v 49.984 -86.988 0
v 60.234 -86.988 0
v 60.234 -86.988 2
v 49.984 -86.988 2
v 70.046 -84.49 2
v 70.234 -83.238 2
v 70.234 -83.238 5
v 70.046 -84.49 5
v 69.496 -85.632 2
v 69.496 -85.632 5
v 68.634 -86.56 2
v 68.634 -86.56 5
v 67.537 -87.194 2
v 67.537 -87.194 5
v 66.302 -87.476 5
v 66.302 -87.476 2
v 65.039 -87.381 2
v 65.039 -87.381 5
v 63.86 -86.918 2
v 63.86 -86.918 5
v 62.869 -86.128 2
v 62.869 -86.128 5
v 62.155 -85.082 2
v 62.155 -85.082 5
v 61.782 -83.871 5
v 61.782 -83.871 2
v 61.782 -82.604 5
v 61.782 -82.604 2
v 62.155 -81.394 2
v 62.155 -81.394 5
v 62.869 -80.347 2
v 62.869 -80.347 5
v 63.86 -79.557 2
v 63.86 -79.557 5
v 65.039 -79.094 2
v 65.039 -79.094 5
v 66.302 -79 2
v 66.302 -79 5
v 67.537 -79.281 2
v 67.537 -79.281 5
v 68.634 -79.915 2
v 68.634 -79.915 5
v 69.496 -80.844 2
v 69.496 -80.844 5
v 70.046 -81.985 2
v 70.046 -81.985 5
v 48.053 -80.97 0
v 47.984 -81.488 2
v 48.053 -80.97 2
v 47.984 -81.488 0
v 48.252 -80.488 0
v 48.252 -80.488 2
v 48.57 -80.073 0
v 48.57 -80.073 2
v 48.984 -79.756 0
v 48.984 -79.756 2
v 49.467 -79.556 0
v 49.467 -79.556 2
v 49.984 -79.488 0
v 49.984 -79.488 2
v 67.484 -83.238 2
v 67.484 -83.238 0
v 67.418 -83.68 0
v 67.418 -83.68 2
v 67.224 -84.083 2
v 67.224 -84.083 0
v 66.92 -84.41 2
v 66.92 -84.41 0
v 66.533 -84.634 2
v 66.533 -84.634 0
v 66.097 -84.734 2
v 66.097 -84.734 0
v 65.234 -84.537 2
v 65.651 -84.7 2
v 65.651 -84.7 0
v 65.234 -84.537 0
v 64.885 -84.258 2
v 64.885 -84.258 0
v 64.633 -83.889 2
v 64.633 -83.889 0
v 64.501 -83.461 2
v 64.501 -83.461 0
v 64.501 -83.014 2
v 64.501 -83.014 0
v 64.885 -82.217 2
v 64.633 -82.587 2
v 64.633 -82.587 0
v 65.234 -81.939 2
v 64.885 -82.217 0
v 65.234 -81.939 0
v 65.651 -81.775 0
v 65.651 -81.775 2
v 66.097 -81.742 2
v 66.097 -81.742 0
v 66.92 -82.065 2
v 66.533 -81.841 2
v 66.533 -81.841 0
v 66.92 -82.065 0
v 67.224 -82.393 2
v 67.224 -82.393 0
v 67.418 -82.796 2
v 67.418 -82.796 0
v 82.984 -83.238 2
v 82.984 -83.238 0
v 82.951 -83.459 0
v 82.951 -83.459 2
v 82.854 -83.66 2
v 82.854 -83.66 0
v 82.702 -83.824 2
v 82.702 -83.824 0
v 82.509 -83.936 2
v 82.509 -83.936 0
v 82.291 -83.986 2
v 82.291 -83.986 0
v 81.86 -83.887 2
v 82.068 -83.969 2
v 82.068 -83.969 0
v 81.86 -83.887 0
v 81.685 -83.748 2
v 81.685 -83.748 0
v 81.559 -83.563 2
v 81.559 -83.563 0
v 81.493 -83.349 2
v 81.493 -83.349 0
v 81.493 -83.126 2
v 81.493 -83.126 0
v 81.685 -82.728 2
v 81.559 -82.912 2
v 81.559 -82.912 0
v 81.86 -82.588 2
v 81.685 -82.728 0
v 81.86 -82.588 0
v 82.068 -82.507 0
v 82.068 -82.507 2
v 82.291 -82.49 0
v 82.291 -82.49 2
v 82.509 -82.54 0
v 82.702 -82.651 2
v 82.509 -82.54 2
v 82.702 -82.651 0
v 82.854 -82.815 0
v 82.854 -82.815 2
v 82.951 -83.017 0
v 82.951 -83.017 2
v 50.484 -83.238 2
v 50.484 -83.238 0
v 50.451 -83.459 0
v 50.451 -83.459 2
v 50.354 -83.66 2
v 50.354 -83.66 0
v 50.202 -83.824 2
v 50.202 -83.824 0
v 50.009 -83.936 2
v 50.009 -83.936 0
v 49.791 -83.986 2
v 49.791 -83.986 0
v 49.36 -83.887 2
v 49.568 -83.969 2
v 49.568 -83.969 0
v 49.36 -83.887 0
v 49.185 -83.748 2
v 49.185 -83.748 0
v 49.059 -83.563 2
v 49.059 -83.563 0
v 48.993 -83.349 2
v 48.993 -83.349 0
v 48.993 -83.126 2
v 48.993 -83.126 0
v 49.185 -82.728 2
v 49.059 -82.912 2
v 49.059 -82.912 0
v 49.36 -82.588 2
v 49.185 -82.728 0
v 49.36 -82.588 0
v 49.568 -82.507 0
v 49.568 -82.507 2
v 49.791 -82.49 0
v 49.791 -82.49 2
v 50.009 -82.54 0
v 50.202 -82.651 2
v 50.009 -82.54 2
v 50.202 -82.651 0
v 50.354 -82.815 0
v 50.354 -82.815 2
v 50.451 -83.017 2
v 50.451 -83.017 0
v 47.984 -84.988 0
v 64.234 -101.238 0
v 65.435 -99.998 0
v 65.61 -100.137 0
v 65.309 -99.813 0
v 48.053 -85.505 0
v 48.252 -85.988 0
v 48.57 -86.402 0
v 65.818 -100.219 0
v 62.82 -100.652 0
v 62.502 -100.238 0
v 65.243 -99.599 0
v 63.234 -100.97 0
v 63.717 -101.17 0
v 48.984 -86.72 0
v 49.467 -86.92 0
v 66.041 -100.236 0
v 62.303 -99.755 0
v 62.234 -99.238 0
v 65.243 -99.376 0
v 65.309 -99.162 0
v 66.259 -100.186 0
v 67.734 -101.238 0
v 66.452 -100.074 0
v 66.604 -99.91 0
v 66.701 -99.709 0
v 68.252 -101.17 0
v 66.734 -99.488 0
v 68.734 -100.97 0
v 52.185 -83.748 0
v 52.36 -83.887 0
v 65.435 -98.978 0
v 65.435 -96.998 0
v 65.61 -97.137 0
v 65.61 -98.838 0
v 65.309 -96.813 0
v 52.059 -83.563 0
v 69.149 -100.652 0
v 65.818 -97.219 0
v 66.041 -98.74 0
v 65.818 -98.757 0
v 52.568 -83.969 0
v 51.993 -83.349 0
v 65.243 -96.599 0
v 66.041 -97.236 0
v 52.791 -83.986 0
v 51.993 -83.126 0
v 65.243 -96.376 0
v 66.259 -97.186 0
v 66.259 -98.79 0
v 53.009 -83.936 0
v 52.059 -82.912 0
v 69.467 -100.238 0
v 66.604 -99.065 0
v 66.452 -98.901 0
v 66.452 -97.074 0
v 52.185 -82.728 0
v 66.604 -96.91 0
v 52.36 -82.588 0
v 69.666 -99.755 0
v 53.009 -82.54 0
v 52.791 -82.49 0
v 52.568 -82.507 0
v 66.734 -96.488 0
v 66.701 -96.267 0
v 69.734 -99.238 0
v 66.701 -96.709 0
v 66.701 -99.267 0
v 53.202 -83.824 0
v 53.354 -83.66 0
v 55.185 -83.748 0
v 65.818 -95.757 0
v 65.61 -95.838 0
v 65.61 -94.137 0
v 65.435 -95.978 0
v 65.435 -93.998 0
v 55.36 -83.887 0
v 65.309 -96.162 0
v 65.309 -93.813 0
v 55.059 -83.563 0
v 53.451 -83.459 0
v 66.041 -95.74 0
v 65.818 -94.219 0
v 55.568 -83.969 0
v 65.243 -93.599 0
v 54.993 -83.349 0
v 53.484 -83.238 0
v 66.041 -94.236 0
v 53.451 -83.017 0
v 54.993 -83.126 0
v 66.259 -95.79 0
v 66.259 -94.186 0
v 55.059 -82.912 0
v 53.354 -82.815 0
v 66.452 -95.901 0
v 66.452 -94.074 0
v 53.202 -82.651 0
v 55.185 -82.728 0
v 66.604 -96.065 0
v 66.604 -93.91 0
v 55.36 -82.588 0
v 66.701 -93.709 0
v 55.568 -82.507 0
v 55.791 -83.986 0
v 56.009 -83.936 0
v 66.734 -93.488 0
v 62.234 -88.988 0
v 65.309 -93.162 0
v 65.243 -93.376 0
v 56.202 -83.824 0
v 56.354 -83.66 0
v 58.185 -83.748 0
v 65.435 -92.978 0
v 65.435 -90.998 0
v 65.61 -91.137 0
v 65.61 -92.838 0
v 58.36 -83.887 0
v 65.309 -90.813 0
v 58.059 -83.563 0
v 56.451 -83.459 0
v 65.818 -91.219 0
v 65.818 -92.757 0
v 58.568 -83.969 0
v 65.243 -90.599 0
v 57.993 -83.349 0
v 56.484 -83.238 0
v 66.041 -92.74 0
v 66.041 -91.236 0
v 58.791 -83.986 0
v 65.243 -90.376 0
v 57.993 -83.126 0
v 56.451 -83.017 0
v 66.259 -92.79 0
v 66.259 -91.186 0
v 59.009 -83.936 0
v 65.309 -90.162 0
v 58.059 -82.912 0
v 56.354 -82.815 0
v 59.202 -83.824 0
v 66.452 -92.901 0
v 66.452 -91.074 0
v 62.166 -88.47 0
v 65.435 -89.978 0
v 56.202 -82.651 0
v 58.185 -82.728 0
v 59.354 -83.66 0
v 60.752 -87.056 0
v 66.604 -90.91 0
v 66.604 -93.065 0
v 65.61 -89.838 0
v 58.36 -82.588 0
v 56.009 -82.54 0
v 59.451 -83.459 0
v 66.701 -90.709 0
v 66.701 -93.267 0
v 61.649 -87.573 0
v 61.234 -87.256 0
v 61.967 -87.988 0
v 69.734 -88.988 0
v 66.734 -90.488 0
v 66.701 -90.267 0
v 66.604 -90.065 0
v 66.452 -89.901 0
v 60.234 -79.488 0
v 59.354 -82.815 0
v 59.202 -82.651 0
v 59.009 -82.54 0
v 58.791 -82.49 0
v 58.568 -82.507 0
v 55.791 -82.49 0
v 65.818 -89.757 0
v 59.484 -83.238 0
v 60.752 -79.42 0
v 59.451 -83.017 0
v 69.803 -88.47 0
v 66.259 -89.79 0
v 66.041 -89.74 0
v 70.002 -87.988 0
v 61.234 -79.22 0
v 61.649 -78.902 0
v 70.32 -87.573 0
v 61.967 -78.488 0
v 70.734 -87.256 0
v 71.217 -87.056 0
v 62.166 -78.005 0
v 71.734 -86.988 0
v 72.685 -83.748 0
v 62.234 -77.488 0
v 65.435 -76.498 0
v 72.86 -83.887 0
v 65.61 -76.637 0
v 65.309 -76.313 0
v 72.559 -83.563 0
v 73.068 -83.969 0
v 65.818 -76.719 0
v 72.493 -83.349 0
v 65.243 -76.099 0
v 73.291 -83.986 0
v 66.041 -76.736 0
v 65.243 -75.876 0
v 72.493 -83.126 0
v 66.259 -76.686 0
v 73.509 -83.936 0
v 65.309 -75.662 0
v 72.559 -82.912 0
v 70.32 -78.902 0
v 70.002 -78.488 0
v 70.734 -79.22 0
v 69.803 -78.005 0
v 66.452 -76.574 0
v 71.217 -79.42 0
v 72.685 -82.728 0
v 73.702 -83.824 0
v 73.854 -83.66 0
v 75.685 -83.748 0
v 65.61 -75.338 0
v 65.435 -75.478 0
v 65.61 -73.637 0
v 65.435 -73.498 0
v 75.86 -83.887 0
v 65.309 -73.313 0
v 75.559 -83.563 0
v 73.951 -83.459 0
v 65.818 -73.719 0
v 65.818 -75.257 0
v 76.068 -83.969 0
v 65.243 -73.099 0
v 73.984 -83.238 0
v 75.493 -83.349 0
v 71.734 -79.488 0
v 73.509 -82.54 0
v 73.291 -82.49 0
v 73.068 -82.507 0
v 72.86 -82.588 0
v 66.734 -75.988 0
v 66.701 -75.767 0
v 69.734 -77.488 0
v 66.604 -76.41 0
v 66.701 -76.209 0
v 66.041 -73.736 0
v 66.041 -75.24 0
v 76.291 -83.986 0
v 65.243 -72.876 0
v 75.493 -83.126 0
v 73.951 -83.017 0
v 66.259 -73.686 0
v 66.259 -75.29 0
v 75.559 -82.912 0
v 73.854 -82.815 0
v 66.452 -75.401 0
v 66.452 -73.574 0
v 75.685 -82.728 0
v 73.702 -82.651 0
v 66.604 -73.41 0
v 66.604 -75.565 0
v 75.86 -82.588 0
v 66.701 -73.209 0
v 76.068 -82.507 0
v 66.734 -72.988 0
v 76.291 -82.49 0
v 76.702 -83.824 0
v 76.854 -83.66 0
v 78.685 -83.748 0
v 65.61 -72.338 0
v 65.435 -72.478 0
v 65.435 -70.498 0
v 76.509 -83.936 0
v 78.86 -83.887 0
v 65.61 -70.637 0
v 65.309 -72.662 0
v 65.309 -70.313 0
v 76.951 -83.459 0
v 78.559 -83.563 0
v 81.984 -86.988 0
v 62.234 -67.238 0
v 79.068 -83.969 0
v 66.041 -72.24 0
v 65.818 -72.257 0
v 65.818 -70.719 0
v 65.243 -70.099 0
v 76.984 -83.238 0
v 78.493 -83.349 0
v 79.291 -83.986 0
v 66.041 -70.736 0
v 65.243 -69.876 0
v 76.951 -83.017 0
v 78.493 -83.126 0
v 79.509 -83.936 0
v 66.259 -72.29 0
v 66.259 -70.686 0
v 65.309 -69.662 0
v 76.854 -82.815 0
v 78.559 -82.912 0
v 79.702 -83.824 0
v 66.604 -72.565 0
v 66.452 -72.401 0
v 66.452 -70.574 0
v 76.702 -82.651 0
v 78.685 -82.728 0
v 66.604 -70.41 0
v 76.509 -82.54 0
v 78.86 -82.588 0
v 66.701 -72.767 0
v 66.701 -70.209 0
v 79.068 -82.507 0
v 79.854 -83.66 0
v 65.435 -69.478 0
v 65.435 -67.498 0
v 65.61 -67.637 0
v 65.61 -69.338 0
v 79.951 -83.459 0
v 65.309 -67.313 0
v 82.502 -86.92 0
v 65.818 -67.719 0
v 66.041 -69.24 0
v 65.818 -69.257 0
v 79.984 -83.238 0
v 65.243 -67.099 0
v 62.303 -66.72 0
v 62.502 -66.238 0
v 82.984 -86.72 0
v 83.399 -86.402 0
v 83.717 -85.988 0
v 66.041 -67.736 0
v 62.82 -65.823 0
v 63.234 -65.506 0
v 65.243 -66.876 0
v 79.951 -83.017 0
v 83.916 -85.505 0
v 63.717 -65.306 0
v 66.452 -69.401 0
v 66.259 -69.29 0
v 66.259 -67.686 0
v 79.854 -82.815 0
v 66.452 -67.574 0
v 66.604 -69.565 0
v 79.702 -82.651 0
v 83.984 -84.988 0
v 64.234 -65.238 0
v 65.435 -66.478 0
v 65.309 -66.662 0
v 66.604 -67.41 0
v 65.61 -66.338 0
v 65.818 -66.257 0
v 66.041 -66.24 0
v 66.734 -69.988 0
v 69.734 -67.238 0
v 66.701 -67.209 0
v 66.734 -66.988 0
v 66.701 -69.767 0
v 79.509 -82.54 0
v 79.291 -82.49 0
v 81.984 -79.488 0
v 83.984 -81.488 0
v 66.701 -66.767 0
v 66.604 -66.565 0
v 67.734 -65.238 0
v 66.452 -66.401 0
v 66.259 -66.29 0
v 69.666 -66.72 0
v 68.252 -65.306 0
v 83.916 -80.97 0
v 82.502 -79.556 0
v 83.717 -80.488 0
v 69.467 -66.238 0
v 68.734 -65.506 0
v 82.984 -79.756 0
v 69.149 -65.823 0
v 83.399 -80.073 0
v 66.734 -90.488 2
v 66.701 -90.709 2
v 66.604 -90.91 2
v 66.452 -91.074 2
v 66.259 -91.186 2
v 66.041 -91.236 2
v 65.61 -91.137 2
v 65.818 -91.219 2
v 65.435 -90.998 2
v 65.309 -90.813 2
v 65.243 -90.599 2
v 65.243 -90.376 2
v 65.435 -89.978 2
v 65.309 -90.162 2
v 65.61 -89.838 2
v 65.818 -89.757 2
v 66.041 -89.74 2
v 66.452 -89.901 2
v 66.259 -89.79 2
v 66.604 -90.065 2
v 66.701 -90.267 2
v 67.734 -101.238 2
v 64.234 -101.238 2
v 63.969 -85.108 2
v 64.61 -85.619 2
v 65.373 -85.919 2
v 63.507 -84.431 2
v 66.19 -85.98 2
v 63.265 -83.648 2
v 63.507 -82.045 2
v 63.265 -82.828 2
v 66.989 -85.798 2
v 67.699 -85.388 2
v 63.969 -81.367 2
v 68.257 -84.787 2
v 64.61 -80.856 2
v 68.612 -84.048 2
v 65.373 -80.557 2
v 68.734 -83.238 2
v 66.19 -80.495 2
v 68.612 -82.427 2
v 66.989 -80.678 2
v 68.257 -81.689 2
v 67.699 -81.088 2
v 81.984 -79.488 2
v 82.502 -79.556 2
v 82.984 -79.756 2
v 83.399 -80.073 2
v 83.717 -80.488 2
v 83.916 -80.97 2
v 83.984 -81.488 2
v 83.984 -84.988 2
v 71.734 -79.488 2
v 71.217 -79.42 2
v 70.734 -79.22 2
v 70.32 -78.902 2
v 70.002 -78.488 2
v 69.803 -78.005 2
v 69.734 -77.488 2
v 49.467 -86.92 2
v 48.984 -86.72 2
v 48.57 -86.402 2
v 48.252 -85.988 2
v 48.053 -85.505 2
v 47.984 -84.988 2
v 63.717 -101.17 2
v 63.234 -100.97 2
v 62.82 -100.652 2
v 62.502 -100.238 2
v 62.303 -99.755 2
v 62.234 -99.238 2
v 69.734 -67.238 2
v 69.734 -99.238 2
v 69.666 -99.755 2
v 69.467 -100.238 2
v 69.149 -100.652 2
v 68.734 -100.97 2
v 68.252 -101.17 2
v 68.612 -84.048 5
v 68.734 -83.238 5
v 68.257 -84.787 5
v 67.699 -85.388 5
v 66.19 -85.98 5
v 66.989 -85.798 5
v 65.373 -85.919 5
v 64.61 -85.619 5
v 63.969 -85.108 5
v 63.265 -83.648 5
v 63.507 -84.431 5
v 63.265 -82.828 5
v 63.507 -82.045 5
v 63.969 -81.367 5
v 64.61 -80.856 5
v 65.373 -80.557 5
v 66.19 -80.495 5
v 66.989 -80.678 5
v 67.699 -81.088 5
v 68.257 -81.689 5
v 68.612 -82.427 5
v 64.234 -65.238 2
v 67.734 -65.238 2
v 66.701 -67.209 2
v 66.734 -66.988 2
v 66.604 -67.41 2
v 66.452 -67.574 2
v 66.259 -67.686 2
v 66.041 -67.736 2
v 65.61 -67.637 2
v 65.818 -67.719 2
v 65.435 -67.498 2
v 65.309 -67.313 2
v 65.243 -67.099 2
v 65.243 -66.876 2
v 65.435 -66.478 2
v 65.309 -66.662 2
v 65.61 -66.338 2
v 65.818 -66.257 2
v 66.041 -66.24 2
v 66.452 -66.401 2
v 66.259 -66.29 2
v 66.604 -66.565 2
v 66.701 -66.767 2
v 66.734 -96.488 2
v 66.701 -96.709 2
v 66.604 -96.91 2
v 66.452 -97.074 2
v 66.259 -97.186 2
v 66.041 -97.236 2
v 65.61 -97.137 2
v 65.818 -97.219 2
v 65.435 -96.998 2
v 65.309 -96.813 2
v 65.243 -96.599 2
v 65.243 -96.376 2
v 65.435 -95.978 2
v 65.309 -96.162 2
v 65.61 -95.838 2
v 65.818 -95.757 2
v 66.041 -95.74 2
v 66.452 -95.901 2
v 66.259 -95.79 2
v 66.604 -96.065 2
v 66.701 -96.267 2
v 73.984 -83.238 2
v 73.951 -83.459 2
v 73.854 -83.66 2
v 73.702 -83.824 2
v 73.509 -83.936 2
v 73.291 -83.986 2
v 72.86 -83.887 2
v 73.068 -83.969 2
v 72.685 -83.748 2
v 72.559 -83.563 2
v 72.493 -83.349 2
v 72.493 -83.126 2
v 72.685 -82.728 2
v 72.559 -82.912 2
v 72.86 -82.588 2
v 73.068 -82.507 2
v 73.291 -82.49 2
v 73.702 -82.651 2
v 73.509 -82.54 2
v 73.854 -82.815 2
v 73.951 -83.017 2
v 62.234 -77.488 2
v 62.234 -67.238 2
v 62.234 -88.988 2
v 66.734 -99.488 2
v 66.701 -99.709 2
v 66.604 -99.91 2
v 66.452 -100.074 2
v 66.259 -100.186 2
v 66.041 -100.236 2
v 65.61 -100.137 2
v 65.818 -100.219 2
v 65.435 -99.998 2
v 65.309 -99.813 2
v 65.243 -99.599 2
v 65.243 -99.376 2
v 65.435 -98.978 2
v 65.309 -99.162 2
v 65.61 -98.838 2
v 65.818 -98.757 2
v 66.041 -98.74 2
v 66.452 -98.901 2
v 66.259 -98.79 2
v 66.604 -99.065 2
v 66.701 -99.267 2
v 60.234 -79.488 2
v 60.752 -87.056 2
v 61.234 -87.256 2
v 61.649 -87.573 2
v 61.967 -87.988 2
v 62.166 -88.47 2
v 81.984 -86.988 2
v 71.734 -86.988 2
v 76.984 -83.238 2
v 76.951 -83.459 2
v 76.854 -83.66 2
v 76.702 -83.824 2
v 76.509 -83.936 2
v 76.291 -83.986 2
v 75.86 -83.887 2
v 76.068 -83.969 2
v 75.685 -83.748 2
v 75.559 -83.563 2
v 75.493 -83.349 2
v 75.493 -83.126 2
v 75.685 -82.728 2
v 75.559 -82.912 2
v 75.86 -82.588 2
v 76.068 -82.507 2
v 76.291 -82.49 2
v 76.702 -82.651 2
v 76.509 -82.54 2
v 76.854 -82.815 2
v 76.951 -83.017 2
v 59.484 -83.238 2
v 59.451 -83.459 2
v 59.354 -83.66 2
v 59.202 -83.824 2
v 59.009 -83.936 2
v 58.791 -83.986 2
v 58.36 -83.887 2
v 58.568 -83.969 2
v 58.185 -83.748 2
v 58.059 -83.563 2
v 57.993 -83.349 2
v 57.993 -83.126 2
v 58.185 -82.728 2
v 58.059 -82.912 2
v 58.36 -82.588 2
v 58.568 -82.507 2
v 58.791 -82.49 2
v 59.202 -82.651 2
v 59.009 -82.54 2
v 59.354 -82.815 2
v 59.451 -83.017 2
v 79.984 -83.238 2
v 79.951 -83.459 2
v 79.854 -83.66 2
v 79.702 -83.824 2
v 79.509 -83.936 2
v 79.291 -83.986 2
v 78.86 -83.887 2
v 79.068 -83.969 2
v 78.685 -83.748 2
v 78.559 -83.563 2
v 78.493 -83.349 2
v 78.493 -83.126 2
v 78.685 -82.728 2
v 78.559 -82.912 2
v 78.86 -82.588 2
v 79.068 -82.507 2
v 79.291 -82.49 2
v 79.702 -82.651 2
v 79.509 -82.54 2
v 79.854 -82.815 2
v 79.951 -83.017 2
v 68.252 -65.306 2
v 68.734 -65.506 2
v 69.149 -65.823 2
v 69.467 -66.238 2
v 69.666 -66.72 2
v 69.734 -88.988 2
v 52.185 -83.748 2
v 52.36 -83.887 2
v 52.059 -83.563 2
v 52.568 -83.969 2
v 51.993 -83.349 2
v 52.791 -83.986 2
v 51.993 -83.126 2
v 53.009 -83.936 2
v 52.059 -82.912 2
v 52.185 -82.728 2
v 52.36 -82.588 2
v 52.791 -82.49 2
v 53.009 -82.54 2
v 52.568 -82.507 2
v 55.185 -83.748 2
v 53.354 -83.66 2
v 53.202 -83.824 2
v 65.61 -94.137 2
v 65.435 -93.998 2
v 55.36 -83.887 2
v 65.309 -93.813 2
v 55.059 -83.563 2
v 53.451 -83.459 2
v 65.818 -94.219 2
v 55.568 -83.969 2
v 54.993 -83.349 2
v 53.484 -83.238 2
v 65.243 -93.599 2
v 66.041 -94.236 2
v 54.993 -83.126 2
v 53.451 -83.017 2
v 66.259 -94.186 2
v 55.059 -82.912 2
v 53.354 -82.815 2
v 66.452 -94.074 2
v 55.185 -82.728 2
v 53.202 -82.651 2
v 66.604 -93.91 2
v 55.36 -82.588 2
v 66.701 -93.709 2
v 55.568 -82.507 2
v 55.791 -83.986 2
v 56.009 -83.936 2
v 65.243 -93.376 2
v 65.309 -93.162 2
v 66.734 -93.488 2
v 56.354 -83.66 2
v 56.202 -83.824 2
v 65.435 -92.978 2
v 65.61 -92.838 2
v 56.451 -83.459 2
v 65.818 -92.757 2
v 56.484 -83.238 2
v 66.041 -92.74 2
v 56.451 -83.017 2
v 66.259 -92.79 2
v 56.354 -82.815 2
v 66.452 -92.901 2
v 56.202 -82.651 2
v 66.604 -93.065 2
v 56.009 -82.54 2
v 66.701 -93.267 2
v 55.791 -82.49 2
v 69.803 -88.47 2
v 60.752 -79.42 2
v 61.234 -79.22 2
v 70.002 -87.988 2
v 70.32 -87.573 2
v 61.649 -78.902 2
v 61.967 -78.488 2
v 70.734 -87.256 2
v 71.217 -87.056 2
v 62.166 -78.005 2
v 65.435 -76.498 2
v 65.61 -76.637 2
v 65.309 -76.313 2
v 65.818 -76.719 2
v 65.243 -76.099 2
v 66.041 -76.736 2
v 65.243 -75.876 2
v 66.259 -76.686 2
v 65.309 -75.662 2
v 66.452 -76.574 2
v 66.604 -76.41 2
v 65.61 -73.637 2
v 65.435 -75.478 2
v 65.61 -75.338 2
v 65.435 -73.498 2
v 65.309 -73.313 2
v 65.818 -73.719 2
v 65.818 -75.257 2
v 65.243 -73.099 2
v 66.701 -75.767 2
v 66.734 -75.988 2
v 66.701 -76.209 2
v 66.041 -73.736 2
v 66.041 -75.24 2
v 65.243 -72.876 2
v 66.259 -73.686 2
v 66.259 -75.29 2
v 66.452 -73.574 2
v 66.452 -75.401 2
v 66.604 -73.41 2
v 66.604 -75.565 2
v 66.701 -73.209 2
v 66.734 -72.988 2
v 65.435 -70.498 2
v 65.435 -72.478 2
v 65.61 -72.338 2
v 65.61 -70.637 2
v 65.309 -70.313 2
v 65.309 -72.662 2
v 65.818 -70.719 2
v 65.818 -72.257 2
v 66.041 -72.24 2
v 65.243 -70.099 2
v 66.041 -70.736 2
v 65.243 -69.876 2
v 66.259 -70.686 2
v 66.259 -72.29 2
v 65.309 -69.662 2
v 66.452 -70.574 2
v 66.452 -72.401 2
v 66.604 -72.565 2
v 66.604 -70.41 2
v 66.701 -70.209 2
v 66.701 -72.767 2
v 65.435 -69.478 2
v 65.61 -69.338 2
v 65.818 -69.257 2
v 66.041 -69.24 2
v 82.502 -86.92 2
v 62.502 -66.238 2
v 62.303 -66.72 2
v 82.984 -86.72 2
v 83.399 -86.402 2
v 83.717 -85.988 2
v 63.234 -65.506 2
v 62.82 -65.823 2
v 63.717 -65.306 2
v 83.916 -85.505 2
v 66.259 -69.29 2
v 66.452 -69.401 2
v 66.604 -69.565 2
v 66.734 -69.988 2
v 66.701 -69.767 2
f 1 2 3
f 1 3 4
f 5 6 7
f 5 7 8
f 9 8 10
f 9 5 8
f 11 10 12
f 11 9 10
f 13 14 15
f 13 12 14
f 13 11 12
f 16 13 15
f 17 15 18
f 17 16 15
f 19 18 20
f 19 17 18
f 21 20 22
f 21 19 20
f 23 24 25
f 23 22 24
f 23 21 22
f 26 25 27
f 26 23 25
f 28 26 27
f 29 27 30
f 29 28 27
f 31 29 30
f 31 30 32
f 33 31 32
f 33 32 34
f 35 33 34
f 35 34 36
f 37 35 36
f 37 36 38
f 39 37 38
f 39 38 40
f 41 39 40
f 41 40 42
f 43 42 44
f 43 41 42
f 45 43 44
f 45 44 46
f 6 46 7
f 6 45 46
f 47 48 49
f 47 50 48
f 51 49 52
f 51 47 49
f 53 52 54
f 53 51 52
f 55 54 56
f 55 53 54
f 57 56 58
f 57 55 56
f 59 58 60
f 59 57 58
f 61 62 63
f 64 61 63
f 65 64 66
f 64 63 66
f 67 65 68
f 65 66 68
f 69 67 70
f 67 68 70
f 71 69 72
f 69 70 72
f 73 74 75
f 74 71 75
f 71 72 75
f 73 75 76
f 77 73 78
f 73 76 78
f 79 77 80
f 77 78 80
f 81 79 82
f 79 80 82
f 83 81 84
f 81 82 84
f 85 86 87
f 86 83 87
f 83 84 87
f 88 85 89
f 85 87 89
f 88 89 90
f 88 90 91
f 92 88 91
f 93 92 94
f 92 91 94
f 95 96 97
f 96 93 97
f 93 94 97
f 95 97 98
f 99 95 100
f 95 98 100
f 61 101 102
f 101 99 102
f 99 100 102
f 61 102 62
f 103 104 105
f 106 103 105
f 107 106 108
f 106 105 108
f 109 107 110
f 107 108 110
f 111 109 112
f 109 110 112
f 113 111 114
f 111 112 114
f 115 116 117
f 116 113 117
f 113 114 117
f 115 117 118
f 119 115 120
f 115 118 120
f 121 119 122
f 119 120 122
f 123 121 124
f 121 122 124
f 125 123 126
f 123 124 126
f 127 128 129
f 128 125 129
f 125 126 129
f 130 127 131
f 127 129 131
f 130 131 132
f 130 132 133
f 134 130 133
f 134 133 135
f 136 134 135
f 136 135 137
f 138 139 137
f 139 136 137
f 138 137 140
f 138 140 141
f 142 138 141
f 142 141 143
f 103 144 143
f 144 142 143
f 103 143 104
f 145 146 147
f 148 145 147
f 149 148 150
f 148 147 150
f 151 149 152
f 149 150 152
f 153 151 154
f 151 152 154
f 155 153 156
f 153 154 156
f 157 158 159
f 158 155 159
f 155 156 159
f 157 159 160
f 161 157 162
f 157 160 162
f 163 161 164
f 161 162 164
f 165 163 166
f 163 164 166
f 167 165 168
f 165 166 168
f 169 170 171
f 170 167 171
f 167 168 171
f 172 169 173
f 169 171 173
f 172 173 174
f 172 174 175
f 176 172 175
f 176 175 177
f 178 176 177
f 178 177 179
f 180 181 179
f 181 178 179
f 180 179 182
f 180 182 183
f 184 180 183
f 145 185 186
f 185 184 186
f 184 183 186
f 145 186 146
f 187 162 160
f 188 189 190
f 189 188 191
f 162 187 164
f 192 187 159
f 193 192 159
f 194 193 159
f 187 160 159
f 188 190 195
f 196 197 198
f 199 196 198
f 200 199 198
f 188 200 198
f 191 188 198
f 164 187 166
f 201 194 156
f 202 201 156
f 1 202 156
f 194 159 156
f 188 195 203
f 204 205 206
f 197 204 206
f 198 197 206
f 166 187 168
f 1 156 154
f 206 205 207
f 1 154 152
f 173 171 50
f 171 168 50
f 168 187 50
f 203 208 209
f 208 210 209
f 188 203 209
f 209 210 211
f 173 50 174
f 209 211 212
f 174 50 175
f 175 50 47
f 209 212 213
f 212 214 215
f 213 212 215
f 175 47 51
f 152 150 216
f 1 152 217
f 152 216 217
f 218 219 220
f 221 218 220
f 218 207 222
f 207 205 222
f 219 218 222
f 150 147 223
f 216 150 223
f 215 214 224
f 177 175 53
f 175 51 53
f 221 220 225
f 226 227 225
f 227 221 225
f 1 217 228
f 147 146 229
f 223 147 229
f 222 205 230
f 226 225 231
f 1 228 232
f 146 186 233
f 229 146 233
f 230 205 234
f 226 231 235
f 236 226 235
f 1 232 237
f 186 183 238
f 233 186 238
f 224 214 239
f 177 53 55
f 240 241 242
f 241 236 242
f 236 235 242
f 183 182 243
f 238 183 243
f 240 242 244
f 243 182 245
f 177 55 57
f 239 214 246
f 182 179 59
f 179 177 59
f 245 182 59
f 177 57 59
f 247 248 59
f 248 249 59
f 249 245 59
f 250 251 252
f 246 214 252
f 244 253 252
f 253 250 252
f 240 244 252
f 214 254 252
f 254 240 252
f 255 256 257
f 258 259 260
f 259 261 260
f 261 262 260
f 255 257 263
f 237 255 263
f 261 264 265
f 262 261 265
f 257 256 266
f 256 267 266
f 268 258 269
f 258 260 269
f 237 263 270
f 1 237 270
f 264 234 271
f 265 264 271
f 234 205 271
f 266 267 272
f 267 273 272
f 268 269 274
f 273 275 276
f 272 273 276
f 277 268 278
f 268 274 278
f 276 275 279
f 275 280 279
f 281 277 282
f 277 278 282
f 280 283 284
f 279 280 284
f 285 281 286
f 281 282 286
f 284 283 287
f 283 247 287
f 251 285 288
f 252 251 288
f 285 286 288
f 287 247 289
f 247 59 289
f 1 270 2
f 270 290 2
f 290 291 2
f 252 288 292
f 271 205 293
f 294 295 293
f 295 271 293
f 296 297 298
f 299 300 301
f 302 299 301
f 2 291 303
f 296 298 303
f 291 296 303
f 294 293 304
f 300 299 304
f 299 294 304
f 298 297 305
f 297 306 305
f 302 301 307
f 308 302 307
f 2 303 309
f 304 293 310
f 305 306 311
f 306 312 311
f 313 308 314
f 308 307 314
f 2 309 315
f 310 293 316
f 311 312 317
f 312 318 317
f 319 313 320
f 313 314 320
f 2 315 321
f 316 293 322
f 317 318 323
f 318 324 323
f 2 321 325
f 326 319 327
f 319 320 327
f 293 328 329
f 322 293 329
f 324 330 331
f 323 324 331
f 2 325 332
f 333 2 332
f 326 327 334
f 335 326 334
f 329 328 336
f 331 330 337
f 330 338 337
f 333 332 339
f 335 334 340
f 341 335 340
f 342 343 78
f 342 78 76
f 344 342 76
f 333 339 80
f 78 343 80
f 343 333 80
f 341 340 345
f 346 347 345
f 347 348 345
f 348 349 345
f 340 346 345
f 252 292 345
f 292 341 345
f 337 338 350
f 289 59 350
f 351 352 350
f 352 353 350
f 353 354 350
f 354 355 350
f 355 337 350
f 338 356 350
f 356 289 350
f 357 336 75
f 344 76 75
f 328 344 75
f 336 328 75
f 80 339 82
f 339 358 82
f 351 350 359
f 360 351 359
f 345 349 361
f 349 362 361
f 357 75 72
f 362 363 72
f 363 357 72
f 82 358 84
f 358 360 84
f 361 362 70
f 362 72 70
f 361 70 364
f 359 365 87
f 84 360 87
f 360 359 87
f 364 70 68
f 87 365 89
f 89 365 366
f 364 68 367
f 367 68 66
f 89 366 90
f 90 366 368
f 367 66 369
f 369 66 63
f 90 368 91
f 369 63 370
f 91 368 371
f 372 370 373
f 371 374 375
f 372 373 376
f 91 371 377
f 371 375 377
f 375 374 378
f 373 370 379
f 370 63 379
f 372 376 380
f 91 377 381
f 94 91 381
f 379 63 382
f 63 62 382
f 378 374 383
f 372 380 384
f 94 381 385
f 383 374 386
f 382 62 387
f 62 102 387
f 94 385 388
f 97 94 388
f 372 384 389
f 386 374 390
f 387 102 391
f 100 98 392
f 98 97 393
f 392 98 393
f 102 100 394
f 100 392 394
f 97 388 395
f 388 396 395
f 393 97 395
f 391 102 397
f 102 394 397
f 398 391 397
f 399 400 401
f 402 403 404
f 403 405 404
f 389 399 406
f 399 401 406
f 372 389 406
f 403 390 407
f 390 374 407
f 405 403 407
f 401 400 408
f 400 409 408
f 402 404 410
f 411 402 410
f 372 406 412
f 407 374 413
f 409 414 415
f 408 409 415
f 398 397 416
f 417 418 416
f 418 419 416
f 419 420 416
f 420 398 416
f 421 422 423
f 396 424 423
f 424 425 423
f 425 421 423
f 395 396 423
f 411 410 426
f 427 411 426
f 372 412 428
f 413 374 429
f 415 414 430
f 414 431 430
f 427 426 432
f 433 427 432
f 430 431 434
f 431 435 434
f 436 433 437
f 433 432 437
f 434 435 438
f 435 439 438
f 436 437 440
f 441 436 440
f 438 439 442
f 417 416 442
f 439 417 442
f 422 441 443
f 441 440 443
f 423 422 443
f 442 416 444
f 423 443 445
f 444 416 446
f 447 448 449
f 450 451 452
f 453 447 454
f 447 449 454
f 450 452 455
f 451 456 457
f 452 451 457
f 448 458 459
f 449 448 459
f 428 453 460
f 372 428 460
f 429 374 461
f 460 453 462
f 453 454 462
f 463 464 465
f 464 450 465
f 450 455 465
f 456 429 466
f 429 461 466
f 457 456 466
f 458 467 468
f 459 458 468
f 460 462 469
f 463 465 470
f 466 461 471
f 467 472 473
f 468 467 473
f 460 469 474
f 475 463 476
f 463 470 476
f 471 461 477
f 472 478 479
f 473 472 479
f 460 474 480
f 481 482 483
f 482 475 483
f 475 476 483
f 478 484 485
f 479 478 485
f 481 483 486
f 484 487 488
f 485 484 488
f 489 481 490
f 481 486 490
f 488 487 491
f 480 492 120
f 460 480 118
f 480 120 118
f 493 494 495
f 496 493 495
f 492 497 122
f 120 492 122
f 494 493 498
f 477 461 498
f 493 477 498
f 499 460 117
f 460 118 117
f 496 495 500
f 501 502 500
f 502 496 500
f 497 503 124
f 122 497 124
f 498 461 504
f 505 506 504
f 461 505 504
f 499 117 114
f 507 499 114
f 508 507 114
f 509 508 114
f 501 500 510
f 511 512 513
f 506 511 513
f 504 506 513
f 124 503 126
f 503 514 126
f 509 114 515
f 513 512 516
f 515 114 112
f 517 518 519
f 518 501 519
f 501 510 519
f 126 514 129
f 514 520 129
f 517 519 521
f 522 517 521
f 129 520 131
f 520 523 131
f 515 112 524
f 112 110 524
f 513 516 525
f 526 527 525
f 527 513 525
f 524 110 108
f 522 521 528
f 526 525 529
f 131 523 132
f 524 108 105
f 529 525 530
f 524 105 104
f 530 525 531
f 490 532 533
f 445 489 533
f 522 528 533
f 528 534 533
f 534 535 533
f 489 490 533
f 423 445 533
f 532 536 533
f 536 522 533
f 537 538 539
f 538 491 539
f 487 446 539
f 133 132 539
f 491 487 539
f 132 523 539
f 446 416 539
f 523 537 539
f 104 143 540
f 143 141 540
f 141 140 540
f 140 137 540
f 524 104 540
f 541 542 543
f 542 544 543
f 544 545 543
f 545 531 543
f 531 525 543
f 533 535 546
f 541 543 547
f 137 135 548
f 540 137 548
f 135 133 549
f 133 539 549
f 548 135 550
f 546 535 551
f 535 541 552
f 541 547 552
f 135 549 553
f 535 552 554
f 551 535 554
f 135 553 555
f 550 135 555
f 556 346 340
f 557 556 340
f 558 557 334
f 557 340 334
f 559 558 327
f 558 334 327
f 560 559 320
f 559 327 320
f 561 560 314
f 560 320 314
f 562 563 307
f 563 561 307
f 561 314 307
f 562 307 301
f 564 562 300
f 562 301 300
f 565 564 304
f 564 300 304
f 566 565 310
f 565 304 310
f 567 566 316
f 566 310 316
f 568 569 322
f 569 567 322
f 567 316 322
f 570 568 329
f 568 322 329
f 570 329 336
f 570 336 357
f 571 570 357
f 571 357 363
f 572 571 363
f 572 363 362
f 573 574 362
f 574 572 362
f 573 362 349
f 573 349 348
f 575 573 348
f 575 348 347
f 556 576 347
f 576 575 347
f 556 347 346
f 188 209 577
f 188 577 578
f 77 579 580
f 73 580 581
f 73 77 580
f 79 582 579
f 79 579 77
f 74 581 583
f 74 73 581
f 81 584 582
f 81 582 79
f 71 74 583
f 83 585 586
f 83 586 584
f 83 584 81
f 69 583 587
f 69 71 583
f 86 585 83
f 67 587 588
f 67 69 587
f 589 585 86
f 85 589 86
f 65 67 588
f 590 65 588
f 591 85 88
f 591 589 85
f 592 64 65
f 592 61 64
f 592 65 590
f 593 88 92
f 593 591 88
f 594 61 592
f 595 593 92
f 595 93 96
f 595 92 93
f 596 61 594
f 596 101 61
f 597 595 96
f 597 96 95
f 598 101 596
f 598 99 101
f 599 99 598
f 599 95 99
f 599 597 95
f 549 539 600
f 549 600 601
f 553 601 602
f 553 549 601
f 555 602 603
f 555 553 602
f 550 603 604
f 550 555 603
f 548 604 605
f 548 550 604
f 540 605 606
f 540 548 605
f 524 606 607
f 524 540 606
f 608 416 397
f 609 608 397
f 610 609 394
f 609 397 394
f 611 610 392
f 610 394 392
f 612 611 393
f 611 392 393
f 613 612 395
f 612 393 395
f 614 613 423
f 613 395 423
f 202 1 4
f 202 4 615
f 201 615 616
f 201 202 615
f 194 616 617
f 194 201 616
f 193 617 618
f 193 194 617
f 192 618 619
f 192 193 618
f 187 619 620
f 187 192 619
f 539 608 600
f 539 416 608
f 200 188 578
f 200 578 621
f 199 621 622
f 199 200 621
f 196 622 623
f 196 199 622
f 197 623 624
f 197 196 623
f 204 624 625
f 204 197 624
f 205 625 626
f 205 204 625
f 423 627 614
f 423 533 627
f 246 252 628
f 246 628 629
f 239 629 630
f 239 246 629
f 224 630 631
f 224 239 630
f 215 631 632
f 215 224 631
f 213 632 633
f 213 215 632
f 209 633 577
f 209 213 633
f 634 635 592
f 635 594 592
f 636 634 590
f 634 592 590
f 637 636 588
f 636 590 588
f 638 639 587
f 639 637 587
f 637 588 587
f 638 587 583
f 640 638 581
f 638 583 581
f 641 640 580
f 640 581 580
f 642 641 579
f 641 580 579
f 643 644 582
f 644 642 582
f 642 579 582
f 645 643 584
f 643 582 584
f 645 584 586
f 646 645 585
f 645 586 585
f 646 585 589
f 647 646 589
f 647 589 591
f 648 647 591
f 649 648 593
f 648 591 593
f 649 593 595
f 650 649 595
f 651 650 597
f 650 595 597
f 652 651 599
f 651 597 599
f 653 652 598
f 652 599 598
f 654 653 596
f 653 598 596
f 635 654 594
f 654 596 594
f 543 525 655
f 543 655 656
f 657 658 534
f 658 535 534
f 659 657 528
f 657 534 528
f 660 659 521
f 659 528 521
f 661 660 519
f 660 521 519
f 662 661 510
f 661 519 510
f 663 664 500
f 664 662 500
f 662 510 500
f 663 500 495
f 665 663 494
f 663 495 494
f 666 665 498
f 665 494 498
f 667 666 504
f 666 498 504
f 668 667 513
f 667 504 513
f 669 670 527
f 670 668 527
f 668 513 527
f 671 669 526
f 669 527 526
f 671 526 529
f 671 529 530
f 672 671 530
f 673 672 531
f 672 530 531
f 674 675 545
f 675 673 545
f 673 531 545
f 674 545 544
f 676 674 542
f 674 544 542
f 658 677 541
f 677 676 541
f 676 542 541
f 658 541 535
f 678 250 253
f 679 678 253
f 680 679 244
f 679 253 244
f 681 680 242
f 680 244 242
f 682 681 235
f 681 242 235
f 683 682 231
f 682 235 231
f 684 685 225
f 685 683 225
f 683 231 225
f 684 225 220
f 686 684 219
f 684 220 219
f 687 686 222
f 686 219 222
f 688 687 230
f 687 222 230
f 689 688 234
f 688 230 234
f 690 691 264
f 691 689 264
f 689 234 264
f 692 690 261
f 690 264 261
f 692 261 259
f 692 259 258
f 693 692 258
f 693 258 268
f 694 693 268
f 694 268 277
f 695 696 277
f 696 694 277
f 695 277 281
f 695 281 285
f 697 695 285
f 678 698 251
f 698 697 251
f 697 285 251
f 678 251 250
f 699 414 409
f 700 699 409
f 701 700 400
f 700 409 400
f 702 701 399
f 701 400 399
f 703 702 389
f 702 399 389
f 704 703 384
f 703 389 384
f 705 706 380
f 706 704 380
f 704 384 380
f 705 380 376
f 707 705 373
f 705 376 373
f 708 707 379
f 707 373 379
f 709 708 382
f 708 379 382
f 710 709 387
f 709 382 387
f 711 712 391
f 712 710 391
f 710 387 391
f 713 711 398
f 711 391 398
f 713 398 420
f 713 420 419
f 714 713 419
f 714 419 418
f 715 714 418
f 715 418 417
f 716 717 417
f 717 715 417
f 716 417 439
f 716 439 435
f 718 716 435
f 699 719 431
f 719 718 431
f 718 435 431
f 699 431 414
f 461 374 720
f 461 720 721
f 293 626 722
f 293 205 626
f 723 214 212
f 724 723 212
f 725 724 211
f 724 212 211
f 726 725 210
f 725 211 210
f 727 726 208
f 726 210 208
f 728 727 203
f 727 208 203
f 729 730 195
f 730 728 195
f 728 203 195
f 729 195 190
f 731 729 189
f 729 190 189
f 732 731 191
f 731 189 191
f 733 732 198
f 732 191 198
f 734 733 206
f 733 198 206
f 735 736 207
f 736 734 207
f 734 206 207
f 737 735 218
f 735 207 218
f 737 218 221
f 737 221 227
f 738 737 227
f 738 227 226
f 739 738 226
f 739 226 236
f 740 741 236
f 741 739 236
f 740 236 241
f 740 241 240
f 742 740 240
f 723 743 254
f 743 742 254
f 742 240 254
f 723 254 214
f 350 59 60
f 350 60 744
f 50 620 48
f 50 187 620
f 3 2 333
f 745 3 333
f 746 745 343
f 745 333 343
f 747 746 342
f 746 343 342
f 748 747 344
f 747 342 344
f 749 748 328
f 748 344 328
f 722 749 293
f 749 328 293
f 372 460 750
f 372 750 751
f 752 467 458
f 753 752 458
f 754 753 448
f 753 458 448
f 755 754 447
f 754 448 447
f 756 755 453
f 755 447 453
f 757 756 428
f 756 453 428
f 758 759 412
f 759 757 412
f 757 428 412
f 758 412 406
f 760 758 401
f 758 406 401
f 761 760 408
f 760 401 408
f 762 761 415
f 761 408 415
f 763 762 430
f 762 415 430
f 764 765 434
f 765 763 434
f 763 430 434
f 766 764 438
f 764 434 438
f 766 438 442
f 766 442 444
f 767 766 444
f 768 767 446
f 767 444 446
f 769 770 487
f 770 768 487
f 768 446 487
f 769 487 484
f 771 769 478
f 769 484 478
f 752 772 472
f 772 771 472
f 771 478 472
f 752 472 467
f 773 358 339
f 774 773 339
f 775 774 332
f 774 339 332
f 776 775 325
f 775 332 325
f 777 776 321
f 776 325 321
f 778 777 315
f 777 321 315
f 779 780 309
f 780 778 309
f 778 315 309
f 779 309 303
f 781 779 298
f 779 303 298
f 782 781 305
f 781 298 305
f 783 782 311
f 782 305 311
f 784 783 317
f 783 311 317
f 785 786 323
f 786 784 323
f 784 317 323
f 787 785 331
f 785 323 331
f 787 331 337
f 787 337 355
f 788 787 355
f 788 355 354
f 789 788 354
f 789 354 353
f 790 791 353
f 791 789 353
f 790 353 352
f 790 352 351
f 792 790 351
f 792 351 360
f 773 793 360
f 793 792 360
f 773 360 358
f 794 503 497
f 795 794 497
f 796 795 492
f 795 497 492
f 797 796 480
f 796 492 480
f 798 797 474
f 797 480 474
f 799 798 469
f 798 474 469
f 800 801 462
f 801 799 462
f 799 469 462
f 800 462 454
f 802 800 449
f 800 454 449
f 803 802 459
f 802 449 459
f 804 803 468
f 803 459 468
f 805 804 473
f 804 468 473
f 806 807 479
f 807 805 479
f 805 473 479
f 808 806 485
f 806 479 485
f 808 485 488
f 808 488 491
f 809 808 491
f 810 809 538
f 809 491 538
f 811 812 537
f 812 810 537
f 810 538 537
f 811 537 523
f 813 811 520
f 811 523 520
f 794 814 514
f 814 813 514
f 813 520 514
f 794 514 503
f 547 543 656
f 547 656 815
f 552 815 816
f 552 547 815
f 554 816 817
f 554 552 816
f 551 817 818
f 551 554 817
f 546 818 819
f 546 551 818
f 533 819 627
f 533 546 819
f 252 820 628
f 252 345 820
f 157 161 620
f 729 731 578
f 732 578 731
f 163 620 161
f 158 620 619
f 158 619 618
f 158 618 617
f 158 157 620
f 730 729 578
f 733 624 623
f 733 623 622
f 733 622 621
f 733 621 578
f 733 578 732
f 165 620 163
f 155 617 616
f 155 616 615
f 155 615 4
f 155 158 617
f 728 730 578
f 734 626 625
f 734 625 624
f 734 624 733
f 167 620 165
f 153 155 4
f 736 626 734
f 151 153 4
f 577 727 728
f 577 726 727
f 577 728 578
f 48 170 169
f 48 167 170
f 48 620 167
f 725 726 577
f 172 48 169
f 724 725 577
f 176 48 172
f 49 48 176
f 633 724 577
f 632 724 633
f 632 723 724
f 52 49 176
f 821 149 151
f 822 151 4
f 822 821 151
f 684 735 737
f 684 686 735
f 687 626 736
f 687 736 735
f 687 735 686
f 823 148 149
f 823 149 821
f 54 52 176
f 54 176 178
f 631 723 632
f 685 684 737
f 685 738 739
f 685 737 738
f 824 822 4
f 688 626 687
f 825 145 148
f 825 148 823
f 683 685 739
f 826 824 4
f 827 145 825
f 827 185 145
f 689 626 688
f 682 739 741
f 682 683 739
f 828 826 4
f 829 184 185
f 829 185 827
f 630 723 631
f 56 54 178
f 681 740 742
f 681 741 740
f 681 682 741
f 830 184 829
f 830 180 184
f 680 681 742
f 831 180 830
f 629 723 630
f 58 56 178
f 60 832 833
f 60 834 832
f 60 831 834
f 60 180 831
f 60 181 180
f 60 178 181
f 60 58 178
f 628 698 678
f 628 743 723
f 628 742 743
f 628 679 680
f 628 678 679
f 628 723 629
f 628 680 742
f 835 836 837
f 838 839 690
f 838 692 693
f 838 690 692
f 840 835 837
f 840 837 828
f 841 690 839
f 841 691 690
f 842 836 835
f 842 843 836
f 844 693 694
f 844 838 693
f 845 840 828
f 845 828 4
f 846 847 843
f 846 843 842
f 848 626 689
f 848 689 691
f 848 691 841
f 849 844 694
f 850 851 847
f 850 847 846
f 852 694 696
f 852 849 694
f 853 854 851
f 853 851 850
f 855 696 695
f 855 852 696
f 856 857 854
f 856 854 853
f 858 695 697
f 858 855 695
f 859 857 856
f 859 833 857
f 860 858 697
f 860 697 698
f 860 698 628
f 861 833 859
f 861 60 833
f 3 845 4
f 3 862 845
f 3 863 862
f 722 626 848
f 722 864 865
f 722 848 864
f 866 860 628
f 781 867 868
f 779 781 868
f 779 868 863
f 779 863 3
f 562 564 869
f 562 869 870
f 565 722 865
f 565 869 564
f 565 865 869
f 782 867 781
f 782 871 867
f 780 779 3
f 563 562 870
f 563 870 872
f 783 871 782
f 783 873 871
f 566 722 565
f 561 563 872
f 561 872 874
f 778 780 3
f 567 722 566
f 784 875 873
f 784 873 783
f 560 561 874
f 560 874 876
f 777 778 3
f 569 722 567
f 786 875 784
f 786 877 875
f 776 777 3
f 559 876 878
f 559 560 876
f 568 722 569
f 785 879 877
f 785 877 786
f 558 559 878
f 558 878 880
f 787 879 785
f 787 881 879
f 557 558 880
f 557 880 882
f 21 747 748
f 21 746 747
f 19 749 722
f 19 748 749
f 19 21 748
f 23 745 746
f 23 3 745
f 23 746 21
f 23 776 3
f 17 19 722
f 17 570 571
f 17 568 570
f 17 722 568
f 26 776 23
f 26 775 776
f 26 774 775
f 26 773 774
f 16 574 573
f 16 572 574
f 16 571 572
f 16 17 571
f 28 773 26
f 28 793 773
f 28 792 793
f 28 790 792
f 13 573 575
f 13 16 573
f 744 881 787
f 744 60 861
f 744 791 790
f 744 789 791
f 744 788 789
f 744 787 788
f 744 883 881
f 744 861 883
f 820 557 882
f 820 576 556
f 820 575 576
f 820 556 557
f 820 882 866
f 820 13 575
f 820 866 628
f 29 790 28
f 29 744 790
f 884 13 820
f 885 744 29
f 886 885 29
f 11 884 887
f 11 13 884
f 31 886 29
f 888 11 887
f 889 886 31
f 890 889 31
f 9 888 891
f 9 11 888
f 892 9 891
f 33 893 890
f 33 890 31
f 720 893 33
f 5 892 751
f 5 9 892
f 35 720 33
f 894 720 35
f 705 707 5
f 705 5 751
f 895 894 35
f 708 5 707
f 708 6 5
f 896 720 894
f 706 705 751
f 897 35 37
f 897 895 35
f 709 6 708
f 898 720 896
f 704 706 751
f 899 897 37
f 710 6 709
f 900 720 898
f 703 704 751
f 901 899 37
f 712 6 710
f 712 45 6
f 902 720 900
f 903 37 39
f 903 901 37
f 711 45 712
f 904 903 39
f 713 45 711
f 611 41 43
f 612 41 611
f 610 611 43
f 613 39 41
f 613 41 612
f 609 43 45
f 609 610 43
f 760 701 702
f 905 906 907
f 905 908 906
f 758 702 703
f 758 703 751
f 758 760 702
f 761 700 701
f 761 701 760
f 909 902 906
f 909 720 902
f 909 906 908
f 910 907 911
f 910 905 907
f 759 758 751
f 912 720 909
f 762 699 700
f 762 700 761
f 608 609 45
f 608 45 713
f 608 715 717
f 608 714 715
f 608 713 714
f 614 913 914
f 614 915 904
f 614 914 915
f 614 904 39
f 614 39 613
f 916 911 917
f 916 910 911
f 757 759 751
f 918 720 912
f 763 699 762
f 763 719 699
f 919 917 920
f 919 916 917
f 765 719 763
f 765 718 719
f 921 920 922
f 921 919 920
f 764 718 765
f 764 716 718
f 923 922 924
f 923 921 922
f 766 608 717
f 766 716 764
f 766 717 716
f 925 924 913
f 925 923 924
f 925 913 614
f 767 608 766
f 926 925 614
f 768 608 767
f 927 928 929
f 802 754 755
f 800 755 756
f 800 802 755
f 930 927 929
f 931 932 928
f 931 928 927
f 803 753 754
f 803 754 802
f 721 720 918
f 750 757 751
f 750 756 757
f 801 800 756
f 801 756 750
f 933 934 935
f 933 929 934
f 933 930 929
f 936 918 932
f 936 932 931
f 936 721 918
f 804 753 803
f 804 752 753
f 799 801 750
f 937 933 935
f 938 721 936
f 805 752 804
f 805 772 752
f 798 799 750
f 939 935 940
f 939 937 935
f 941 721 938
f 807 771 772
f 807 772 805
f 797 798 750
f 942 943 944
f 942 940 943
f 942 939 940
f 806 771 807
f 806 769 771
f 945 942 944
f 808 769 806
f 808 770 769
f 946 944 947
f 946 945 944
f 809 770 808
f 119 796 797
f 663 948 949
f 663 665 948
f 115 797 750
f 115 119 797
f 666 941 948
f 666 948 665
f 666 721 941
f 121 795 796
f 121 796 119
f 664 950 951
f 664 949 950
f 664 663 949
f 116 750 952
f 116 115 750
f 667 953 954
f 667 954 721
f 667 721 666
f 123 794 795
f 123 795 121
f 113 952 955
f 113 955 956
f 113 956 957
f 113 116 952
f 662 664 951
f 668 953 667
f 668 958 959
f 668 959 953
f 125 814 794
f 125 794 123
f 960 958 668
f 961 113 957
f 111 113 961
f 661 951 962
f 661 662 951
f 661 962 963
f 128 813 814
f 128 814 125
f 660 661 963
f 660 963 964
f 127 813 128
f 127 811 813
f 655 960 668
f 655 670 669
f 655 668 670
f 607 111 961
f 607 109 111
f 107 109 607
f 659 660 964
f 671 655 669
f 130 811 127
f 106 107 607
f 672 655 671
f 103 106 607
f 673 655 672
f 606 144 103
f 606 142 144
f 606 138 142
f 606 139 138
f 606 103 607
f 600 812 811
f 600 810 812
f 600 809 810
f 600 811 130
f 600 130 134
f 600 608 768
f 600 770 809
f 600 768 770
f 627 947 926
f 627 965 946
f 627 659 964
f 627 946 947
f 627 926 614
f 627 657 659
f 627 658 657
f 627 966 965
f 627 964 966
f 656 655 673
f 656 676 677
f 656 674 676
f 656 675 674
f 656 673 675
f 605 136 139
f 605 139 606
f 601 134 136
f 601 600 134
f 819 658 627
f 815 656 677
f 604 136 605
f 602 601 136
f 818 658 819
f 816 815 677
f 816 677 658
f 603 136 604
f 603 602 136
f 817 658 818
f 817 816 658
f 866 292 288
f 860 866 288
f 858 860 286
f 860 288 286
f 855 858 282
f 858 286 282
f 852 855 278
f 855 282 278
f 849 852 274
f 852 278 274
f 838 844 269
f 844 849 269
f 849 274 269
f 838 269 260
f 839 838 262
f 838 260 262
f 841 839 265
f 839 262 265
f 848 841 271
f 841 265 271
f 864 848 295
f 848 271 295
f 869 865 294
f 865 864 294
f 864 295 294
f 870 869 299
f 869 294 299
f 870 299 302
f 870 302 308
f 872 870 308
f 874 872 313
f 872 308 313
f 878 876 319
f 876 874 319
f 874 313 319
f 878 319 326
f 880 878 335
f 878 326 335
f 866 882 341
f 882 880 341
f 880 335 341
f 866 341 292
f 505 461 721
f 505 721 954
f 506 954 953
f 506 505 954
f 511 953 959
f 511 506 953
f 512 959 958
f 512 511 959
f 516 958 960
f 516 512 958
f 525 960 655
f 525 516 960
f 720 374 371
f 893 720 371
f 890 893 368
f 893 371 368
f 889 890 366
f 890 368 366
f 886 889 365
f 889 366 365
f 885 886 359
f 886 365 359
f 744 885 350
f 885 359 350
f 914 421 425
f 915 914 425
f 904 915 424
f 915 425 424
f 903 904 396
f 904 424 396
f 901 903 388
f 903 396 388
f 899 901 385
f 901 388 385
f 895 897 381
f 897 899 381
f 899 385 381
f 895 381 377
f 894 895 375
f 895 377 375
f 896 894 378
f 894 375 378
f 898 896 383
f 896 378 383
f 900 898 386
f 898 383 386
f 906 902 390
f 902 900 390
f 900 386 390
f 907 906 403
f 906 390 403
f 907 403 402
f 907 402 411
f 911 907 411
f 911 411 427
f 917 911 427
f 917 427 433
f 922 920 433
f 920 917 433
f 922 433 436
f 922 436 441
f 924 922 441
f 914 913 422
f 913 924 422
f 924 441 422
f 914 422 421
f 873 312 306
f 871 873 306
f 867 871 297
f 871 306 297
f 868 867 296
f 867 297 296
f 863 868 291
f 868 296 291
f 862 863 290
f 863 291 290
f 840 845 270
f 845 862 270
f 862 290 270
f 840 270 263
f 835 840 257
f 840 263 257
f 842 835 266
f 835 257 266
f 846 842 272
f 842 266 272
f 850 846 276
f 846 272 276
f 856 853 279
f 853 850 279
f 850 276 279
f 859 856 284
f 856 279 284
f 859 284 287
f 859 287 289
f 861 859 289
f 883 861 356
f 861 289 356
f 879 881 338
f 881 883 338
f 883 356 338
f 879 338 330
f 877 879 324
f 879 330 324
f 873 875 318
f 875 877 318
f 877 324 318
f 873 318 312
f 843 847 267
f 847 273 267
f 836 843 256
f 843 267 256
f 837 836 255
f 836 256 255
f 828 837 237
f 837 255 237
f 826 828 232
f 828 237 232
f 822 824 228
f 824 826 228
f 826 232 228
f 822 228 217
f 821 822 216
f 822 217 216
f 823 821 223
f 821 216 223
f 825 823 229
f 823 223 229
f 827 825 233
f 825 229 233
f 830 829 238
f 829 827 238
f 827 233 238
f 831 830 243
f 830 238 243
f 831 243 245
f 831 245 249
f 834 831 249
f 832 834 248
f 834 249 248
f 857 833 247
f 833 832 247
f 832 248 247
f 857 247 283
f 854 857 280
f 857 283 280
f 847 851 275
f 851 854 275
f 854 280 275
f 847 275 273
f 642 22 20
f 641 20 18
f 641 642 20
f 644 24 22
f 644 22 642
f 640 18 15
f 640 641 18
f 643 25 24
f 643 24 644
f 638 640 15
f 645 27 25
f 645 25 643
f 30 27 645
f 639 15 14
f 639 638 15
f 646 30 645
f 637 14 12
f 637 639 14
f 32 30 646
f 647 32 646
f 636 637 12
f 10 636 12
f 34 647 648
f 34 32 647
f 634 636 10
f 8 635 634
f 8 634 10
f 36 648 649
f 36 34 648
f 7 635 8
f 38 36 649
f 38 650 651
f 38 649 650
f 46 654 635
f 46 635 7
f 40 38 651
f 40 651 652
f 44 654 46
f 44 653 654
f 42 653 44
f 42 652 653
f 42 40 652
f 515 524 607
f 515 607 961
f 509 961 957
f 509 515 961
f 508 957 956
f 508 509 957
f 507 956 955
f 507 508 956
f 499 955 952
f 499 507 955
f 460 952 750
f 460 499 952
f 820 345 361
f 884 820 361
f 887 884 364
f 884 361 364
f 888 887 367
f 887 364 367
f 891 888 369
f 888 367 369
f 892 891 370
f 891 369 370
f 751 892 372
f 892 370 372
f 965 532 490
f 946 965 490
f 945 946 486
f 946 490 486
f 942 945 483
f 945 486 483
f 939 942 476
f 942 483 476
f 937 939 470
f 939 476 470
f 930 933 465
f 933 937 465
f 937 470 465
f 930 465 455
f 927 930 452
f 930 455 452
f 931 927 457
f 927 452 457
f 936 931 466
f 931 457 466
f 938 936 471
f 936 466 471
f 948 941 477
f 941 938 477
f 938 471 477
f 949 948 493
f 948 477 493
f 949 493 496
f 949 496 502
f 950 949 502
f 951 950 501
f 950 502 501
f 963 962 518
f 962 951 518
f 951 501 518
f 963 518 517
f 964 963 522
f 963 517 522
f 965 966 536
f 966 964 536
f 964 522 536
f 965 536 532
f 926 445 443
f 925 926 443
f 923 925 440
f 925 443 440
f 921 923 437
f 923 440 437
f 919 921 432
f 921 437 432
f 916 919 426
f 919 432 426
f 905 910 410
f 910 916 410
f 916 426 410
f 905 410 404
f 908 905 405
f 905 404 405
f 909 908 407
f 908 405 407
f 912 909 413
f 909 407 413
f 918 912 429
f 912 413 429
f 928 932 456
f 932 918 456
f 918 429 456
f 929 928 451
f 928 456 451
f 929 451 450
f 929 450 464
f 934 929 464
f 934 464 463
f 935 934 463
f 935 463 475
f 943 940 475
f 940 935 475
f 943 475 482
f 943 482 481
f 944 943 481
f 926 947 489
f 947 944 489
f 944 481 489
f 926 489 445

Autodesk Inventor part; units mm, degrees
ref_plane "YZ Plane" through (0, 0, 0) normal (1, 0, 0) x (0, 1, 0)
ref_plane "XZ Plane" through (0, 0, 0) normal (0, 1, 0) x (-1, 0, 0)
ref_plane "XY Plane" through (0, 0, 0) normal (0, 0, 1) x (1, 0, 0)
sketch "Эскиз1" plane through (0, 0, 0) normal (0, 0, 1) x (1, 0, 0)
  line L0 (83.9845, -81.4877) -> (83.9845, -84.9877)
  line L1 (47.9845, -84.9877) -> (47.9845, -81.4877)
  line L2 (64.2345, -65.2377) -> (67.7345, -65.2377)
  line L3 (67.7345, -101.2377) -> (64.2345, -101.2377)
  circle A0 centre (49.7345, -83.2377) radius 0.75
  circle A1 centre (52.7345, -83.2377) radius 0.75
  circle A2 centre (55.7345, -83.2377) radius 0.75
  circle A3 centre (58.7345, -83.2377) radius 0.75
  circle A4 centre (82.2345, -83.2377) radius 0.75
  circle A5 centre (79.2345, -83.2377) radius 0.75
  circle A6 centre (76.2345, -83.2377) radius 0.75
  circle A7 centre (73.2345, -83.2377) radius 0.75
  circle A8 centre (65.9845, -99.4877) radius 0.75
  circle A9 centre (65.9845, -96.4877) radius 0.75
  circle A10 centre (65.9845, -93.4877) radius 0.75
  circle A11 centre (65.9845, -90.4877) radius 0.75
  circle A12 centre (65.9845, -66.9877) radius 0.75
  circle A13 centre (65.9845, -69.9877) radius 0.75
  circle A14 centre (65.9845, -72.9877) radius 0.75
  circle A15 centre (65.9845, -75.9877) radius 0.75
  line L4 (49.9845, -79.4877) -> (60.2345, -79.4877)
  line L5 (71.7345, -79.4877) -> (81.9845, -79.4877)
  line L6 (62.2345, -99.2377) -> (62.2345, -88.9877)
  line L7 (62.2345, -77.4877) -> (62.2345, -67.2377)
  line L8 (81.9845, -86.9877) -> (71.7345, -86.9877)
  line L9 (60.2345, -86.9877) -> (49.9845, -86.9877)
  line L10 (69.7345, -67.2377) -> (69.7345, -77.4877)
  line L11 (69.7345, -88.9877) -> (69.7345, -99.2377)
  circle A16 centre (65.9845, -83.2377) radius 4.25
  circle A17 centre (65.9845, -83.2377) radius 2.75
  arc A18 (60.2345, -79.4877) -> (62.2345, -77.4877) centre (60.2345, -77.4877) ccw
  arc A19 (62.2345, -88.9877) -> (60.2345, -86.9877) centre (60.2345, -88.9877) ccw
  arc A20 (71.7345, -86.9877) -> (69.7345, -88.9877) centre (71.7345, -88.9877) ccw
  arc A21 (69.7345, -77.4877) -> (71.7345, -79.4877) centre (71.7345, -77.4877) ccw
  arc A22 (83.9845, -81.4877) -> (81.9845, -79.4877) centre (81.9845, -81.4877) ccw
  arc A23 (81.9845, -86.9877) -> (83.9845, -84.9877) centre (81.9845, -84.9877) ccw
  arc A24 (69.7345, -67.2377) -> (67.7345, -65.2377) centre (67.7345, -67.2377) ccw
  arc A25 (64.2345, -65.2377) -> (62.2345, -67.2377) centre (64.2345, -67.2377) ccw
  arc A26 (49.9845, -79.4877) -> (47.9845, -81.4877) centre (49.9845, -81.4877) ccw
  arc A27 (47.9845, -84.9877) -> (49.9845, -86.9877) centre (49.9845, -84.9877) ccw
  arc A28 (62.2345, -99.2377) -> (64.2345, -101.2377) centre (64.2345, -99.2377) ccw
  arc A29 (67.7345, -101.2377) -> (69.7345, -99.2377) centre (67.7345, -99.2377) ccw
  circle A30 centre (65.9845, -83.2377) radius 1.5
  point P0 (0, 0)
  point P1 (83.9845, -79.4877)
  point P2 (83.9845, -86.9877)
  point P3 (62.2345, -65.2377)
  point P4 (69.7345, -65.2377)
  point P5 (69.7345, -101.2377)
  point P6 (62.2345, -101.2377)
  dimension "d4" = 7.5
  dimension "d6" = 7.5
  dimension "d7" = 7.5
  dimension "d9" = 1.5
  dimension "d11" = 1.5
  dimension "d13" = 1.5
  dimension "d15" = 1.5
  dimension "d17" = 1.5
  dimension "d19" = 1.5
  dimension "d21" = 1.5
  dimension "d23" = 1.5
  dimension "d24" = 8.5
  dimension "d25" = 5.5
  dimension "d26" = 2
  dimension "d27" = 3
extrude "Выдавливание1" add sketch "Эскиз1" along normal blind 2 contours L0 A23 L8 A20 L11 A29 L3 A28 L6 A19 L9 A27 L1 A26 L4 A18 L7 A25 L2 A24 L10 A21 L5 A22
extrude "Выдавливание2" add sketch "Эскиз1" along normal blind 5 contours A16
extrude "Выдавливание3" add sketch "Эскиз1" along normal blind 2 contours A17
properties part number "Звезда"
